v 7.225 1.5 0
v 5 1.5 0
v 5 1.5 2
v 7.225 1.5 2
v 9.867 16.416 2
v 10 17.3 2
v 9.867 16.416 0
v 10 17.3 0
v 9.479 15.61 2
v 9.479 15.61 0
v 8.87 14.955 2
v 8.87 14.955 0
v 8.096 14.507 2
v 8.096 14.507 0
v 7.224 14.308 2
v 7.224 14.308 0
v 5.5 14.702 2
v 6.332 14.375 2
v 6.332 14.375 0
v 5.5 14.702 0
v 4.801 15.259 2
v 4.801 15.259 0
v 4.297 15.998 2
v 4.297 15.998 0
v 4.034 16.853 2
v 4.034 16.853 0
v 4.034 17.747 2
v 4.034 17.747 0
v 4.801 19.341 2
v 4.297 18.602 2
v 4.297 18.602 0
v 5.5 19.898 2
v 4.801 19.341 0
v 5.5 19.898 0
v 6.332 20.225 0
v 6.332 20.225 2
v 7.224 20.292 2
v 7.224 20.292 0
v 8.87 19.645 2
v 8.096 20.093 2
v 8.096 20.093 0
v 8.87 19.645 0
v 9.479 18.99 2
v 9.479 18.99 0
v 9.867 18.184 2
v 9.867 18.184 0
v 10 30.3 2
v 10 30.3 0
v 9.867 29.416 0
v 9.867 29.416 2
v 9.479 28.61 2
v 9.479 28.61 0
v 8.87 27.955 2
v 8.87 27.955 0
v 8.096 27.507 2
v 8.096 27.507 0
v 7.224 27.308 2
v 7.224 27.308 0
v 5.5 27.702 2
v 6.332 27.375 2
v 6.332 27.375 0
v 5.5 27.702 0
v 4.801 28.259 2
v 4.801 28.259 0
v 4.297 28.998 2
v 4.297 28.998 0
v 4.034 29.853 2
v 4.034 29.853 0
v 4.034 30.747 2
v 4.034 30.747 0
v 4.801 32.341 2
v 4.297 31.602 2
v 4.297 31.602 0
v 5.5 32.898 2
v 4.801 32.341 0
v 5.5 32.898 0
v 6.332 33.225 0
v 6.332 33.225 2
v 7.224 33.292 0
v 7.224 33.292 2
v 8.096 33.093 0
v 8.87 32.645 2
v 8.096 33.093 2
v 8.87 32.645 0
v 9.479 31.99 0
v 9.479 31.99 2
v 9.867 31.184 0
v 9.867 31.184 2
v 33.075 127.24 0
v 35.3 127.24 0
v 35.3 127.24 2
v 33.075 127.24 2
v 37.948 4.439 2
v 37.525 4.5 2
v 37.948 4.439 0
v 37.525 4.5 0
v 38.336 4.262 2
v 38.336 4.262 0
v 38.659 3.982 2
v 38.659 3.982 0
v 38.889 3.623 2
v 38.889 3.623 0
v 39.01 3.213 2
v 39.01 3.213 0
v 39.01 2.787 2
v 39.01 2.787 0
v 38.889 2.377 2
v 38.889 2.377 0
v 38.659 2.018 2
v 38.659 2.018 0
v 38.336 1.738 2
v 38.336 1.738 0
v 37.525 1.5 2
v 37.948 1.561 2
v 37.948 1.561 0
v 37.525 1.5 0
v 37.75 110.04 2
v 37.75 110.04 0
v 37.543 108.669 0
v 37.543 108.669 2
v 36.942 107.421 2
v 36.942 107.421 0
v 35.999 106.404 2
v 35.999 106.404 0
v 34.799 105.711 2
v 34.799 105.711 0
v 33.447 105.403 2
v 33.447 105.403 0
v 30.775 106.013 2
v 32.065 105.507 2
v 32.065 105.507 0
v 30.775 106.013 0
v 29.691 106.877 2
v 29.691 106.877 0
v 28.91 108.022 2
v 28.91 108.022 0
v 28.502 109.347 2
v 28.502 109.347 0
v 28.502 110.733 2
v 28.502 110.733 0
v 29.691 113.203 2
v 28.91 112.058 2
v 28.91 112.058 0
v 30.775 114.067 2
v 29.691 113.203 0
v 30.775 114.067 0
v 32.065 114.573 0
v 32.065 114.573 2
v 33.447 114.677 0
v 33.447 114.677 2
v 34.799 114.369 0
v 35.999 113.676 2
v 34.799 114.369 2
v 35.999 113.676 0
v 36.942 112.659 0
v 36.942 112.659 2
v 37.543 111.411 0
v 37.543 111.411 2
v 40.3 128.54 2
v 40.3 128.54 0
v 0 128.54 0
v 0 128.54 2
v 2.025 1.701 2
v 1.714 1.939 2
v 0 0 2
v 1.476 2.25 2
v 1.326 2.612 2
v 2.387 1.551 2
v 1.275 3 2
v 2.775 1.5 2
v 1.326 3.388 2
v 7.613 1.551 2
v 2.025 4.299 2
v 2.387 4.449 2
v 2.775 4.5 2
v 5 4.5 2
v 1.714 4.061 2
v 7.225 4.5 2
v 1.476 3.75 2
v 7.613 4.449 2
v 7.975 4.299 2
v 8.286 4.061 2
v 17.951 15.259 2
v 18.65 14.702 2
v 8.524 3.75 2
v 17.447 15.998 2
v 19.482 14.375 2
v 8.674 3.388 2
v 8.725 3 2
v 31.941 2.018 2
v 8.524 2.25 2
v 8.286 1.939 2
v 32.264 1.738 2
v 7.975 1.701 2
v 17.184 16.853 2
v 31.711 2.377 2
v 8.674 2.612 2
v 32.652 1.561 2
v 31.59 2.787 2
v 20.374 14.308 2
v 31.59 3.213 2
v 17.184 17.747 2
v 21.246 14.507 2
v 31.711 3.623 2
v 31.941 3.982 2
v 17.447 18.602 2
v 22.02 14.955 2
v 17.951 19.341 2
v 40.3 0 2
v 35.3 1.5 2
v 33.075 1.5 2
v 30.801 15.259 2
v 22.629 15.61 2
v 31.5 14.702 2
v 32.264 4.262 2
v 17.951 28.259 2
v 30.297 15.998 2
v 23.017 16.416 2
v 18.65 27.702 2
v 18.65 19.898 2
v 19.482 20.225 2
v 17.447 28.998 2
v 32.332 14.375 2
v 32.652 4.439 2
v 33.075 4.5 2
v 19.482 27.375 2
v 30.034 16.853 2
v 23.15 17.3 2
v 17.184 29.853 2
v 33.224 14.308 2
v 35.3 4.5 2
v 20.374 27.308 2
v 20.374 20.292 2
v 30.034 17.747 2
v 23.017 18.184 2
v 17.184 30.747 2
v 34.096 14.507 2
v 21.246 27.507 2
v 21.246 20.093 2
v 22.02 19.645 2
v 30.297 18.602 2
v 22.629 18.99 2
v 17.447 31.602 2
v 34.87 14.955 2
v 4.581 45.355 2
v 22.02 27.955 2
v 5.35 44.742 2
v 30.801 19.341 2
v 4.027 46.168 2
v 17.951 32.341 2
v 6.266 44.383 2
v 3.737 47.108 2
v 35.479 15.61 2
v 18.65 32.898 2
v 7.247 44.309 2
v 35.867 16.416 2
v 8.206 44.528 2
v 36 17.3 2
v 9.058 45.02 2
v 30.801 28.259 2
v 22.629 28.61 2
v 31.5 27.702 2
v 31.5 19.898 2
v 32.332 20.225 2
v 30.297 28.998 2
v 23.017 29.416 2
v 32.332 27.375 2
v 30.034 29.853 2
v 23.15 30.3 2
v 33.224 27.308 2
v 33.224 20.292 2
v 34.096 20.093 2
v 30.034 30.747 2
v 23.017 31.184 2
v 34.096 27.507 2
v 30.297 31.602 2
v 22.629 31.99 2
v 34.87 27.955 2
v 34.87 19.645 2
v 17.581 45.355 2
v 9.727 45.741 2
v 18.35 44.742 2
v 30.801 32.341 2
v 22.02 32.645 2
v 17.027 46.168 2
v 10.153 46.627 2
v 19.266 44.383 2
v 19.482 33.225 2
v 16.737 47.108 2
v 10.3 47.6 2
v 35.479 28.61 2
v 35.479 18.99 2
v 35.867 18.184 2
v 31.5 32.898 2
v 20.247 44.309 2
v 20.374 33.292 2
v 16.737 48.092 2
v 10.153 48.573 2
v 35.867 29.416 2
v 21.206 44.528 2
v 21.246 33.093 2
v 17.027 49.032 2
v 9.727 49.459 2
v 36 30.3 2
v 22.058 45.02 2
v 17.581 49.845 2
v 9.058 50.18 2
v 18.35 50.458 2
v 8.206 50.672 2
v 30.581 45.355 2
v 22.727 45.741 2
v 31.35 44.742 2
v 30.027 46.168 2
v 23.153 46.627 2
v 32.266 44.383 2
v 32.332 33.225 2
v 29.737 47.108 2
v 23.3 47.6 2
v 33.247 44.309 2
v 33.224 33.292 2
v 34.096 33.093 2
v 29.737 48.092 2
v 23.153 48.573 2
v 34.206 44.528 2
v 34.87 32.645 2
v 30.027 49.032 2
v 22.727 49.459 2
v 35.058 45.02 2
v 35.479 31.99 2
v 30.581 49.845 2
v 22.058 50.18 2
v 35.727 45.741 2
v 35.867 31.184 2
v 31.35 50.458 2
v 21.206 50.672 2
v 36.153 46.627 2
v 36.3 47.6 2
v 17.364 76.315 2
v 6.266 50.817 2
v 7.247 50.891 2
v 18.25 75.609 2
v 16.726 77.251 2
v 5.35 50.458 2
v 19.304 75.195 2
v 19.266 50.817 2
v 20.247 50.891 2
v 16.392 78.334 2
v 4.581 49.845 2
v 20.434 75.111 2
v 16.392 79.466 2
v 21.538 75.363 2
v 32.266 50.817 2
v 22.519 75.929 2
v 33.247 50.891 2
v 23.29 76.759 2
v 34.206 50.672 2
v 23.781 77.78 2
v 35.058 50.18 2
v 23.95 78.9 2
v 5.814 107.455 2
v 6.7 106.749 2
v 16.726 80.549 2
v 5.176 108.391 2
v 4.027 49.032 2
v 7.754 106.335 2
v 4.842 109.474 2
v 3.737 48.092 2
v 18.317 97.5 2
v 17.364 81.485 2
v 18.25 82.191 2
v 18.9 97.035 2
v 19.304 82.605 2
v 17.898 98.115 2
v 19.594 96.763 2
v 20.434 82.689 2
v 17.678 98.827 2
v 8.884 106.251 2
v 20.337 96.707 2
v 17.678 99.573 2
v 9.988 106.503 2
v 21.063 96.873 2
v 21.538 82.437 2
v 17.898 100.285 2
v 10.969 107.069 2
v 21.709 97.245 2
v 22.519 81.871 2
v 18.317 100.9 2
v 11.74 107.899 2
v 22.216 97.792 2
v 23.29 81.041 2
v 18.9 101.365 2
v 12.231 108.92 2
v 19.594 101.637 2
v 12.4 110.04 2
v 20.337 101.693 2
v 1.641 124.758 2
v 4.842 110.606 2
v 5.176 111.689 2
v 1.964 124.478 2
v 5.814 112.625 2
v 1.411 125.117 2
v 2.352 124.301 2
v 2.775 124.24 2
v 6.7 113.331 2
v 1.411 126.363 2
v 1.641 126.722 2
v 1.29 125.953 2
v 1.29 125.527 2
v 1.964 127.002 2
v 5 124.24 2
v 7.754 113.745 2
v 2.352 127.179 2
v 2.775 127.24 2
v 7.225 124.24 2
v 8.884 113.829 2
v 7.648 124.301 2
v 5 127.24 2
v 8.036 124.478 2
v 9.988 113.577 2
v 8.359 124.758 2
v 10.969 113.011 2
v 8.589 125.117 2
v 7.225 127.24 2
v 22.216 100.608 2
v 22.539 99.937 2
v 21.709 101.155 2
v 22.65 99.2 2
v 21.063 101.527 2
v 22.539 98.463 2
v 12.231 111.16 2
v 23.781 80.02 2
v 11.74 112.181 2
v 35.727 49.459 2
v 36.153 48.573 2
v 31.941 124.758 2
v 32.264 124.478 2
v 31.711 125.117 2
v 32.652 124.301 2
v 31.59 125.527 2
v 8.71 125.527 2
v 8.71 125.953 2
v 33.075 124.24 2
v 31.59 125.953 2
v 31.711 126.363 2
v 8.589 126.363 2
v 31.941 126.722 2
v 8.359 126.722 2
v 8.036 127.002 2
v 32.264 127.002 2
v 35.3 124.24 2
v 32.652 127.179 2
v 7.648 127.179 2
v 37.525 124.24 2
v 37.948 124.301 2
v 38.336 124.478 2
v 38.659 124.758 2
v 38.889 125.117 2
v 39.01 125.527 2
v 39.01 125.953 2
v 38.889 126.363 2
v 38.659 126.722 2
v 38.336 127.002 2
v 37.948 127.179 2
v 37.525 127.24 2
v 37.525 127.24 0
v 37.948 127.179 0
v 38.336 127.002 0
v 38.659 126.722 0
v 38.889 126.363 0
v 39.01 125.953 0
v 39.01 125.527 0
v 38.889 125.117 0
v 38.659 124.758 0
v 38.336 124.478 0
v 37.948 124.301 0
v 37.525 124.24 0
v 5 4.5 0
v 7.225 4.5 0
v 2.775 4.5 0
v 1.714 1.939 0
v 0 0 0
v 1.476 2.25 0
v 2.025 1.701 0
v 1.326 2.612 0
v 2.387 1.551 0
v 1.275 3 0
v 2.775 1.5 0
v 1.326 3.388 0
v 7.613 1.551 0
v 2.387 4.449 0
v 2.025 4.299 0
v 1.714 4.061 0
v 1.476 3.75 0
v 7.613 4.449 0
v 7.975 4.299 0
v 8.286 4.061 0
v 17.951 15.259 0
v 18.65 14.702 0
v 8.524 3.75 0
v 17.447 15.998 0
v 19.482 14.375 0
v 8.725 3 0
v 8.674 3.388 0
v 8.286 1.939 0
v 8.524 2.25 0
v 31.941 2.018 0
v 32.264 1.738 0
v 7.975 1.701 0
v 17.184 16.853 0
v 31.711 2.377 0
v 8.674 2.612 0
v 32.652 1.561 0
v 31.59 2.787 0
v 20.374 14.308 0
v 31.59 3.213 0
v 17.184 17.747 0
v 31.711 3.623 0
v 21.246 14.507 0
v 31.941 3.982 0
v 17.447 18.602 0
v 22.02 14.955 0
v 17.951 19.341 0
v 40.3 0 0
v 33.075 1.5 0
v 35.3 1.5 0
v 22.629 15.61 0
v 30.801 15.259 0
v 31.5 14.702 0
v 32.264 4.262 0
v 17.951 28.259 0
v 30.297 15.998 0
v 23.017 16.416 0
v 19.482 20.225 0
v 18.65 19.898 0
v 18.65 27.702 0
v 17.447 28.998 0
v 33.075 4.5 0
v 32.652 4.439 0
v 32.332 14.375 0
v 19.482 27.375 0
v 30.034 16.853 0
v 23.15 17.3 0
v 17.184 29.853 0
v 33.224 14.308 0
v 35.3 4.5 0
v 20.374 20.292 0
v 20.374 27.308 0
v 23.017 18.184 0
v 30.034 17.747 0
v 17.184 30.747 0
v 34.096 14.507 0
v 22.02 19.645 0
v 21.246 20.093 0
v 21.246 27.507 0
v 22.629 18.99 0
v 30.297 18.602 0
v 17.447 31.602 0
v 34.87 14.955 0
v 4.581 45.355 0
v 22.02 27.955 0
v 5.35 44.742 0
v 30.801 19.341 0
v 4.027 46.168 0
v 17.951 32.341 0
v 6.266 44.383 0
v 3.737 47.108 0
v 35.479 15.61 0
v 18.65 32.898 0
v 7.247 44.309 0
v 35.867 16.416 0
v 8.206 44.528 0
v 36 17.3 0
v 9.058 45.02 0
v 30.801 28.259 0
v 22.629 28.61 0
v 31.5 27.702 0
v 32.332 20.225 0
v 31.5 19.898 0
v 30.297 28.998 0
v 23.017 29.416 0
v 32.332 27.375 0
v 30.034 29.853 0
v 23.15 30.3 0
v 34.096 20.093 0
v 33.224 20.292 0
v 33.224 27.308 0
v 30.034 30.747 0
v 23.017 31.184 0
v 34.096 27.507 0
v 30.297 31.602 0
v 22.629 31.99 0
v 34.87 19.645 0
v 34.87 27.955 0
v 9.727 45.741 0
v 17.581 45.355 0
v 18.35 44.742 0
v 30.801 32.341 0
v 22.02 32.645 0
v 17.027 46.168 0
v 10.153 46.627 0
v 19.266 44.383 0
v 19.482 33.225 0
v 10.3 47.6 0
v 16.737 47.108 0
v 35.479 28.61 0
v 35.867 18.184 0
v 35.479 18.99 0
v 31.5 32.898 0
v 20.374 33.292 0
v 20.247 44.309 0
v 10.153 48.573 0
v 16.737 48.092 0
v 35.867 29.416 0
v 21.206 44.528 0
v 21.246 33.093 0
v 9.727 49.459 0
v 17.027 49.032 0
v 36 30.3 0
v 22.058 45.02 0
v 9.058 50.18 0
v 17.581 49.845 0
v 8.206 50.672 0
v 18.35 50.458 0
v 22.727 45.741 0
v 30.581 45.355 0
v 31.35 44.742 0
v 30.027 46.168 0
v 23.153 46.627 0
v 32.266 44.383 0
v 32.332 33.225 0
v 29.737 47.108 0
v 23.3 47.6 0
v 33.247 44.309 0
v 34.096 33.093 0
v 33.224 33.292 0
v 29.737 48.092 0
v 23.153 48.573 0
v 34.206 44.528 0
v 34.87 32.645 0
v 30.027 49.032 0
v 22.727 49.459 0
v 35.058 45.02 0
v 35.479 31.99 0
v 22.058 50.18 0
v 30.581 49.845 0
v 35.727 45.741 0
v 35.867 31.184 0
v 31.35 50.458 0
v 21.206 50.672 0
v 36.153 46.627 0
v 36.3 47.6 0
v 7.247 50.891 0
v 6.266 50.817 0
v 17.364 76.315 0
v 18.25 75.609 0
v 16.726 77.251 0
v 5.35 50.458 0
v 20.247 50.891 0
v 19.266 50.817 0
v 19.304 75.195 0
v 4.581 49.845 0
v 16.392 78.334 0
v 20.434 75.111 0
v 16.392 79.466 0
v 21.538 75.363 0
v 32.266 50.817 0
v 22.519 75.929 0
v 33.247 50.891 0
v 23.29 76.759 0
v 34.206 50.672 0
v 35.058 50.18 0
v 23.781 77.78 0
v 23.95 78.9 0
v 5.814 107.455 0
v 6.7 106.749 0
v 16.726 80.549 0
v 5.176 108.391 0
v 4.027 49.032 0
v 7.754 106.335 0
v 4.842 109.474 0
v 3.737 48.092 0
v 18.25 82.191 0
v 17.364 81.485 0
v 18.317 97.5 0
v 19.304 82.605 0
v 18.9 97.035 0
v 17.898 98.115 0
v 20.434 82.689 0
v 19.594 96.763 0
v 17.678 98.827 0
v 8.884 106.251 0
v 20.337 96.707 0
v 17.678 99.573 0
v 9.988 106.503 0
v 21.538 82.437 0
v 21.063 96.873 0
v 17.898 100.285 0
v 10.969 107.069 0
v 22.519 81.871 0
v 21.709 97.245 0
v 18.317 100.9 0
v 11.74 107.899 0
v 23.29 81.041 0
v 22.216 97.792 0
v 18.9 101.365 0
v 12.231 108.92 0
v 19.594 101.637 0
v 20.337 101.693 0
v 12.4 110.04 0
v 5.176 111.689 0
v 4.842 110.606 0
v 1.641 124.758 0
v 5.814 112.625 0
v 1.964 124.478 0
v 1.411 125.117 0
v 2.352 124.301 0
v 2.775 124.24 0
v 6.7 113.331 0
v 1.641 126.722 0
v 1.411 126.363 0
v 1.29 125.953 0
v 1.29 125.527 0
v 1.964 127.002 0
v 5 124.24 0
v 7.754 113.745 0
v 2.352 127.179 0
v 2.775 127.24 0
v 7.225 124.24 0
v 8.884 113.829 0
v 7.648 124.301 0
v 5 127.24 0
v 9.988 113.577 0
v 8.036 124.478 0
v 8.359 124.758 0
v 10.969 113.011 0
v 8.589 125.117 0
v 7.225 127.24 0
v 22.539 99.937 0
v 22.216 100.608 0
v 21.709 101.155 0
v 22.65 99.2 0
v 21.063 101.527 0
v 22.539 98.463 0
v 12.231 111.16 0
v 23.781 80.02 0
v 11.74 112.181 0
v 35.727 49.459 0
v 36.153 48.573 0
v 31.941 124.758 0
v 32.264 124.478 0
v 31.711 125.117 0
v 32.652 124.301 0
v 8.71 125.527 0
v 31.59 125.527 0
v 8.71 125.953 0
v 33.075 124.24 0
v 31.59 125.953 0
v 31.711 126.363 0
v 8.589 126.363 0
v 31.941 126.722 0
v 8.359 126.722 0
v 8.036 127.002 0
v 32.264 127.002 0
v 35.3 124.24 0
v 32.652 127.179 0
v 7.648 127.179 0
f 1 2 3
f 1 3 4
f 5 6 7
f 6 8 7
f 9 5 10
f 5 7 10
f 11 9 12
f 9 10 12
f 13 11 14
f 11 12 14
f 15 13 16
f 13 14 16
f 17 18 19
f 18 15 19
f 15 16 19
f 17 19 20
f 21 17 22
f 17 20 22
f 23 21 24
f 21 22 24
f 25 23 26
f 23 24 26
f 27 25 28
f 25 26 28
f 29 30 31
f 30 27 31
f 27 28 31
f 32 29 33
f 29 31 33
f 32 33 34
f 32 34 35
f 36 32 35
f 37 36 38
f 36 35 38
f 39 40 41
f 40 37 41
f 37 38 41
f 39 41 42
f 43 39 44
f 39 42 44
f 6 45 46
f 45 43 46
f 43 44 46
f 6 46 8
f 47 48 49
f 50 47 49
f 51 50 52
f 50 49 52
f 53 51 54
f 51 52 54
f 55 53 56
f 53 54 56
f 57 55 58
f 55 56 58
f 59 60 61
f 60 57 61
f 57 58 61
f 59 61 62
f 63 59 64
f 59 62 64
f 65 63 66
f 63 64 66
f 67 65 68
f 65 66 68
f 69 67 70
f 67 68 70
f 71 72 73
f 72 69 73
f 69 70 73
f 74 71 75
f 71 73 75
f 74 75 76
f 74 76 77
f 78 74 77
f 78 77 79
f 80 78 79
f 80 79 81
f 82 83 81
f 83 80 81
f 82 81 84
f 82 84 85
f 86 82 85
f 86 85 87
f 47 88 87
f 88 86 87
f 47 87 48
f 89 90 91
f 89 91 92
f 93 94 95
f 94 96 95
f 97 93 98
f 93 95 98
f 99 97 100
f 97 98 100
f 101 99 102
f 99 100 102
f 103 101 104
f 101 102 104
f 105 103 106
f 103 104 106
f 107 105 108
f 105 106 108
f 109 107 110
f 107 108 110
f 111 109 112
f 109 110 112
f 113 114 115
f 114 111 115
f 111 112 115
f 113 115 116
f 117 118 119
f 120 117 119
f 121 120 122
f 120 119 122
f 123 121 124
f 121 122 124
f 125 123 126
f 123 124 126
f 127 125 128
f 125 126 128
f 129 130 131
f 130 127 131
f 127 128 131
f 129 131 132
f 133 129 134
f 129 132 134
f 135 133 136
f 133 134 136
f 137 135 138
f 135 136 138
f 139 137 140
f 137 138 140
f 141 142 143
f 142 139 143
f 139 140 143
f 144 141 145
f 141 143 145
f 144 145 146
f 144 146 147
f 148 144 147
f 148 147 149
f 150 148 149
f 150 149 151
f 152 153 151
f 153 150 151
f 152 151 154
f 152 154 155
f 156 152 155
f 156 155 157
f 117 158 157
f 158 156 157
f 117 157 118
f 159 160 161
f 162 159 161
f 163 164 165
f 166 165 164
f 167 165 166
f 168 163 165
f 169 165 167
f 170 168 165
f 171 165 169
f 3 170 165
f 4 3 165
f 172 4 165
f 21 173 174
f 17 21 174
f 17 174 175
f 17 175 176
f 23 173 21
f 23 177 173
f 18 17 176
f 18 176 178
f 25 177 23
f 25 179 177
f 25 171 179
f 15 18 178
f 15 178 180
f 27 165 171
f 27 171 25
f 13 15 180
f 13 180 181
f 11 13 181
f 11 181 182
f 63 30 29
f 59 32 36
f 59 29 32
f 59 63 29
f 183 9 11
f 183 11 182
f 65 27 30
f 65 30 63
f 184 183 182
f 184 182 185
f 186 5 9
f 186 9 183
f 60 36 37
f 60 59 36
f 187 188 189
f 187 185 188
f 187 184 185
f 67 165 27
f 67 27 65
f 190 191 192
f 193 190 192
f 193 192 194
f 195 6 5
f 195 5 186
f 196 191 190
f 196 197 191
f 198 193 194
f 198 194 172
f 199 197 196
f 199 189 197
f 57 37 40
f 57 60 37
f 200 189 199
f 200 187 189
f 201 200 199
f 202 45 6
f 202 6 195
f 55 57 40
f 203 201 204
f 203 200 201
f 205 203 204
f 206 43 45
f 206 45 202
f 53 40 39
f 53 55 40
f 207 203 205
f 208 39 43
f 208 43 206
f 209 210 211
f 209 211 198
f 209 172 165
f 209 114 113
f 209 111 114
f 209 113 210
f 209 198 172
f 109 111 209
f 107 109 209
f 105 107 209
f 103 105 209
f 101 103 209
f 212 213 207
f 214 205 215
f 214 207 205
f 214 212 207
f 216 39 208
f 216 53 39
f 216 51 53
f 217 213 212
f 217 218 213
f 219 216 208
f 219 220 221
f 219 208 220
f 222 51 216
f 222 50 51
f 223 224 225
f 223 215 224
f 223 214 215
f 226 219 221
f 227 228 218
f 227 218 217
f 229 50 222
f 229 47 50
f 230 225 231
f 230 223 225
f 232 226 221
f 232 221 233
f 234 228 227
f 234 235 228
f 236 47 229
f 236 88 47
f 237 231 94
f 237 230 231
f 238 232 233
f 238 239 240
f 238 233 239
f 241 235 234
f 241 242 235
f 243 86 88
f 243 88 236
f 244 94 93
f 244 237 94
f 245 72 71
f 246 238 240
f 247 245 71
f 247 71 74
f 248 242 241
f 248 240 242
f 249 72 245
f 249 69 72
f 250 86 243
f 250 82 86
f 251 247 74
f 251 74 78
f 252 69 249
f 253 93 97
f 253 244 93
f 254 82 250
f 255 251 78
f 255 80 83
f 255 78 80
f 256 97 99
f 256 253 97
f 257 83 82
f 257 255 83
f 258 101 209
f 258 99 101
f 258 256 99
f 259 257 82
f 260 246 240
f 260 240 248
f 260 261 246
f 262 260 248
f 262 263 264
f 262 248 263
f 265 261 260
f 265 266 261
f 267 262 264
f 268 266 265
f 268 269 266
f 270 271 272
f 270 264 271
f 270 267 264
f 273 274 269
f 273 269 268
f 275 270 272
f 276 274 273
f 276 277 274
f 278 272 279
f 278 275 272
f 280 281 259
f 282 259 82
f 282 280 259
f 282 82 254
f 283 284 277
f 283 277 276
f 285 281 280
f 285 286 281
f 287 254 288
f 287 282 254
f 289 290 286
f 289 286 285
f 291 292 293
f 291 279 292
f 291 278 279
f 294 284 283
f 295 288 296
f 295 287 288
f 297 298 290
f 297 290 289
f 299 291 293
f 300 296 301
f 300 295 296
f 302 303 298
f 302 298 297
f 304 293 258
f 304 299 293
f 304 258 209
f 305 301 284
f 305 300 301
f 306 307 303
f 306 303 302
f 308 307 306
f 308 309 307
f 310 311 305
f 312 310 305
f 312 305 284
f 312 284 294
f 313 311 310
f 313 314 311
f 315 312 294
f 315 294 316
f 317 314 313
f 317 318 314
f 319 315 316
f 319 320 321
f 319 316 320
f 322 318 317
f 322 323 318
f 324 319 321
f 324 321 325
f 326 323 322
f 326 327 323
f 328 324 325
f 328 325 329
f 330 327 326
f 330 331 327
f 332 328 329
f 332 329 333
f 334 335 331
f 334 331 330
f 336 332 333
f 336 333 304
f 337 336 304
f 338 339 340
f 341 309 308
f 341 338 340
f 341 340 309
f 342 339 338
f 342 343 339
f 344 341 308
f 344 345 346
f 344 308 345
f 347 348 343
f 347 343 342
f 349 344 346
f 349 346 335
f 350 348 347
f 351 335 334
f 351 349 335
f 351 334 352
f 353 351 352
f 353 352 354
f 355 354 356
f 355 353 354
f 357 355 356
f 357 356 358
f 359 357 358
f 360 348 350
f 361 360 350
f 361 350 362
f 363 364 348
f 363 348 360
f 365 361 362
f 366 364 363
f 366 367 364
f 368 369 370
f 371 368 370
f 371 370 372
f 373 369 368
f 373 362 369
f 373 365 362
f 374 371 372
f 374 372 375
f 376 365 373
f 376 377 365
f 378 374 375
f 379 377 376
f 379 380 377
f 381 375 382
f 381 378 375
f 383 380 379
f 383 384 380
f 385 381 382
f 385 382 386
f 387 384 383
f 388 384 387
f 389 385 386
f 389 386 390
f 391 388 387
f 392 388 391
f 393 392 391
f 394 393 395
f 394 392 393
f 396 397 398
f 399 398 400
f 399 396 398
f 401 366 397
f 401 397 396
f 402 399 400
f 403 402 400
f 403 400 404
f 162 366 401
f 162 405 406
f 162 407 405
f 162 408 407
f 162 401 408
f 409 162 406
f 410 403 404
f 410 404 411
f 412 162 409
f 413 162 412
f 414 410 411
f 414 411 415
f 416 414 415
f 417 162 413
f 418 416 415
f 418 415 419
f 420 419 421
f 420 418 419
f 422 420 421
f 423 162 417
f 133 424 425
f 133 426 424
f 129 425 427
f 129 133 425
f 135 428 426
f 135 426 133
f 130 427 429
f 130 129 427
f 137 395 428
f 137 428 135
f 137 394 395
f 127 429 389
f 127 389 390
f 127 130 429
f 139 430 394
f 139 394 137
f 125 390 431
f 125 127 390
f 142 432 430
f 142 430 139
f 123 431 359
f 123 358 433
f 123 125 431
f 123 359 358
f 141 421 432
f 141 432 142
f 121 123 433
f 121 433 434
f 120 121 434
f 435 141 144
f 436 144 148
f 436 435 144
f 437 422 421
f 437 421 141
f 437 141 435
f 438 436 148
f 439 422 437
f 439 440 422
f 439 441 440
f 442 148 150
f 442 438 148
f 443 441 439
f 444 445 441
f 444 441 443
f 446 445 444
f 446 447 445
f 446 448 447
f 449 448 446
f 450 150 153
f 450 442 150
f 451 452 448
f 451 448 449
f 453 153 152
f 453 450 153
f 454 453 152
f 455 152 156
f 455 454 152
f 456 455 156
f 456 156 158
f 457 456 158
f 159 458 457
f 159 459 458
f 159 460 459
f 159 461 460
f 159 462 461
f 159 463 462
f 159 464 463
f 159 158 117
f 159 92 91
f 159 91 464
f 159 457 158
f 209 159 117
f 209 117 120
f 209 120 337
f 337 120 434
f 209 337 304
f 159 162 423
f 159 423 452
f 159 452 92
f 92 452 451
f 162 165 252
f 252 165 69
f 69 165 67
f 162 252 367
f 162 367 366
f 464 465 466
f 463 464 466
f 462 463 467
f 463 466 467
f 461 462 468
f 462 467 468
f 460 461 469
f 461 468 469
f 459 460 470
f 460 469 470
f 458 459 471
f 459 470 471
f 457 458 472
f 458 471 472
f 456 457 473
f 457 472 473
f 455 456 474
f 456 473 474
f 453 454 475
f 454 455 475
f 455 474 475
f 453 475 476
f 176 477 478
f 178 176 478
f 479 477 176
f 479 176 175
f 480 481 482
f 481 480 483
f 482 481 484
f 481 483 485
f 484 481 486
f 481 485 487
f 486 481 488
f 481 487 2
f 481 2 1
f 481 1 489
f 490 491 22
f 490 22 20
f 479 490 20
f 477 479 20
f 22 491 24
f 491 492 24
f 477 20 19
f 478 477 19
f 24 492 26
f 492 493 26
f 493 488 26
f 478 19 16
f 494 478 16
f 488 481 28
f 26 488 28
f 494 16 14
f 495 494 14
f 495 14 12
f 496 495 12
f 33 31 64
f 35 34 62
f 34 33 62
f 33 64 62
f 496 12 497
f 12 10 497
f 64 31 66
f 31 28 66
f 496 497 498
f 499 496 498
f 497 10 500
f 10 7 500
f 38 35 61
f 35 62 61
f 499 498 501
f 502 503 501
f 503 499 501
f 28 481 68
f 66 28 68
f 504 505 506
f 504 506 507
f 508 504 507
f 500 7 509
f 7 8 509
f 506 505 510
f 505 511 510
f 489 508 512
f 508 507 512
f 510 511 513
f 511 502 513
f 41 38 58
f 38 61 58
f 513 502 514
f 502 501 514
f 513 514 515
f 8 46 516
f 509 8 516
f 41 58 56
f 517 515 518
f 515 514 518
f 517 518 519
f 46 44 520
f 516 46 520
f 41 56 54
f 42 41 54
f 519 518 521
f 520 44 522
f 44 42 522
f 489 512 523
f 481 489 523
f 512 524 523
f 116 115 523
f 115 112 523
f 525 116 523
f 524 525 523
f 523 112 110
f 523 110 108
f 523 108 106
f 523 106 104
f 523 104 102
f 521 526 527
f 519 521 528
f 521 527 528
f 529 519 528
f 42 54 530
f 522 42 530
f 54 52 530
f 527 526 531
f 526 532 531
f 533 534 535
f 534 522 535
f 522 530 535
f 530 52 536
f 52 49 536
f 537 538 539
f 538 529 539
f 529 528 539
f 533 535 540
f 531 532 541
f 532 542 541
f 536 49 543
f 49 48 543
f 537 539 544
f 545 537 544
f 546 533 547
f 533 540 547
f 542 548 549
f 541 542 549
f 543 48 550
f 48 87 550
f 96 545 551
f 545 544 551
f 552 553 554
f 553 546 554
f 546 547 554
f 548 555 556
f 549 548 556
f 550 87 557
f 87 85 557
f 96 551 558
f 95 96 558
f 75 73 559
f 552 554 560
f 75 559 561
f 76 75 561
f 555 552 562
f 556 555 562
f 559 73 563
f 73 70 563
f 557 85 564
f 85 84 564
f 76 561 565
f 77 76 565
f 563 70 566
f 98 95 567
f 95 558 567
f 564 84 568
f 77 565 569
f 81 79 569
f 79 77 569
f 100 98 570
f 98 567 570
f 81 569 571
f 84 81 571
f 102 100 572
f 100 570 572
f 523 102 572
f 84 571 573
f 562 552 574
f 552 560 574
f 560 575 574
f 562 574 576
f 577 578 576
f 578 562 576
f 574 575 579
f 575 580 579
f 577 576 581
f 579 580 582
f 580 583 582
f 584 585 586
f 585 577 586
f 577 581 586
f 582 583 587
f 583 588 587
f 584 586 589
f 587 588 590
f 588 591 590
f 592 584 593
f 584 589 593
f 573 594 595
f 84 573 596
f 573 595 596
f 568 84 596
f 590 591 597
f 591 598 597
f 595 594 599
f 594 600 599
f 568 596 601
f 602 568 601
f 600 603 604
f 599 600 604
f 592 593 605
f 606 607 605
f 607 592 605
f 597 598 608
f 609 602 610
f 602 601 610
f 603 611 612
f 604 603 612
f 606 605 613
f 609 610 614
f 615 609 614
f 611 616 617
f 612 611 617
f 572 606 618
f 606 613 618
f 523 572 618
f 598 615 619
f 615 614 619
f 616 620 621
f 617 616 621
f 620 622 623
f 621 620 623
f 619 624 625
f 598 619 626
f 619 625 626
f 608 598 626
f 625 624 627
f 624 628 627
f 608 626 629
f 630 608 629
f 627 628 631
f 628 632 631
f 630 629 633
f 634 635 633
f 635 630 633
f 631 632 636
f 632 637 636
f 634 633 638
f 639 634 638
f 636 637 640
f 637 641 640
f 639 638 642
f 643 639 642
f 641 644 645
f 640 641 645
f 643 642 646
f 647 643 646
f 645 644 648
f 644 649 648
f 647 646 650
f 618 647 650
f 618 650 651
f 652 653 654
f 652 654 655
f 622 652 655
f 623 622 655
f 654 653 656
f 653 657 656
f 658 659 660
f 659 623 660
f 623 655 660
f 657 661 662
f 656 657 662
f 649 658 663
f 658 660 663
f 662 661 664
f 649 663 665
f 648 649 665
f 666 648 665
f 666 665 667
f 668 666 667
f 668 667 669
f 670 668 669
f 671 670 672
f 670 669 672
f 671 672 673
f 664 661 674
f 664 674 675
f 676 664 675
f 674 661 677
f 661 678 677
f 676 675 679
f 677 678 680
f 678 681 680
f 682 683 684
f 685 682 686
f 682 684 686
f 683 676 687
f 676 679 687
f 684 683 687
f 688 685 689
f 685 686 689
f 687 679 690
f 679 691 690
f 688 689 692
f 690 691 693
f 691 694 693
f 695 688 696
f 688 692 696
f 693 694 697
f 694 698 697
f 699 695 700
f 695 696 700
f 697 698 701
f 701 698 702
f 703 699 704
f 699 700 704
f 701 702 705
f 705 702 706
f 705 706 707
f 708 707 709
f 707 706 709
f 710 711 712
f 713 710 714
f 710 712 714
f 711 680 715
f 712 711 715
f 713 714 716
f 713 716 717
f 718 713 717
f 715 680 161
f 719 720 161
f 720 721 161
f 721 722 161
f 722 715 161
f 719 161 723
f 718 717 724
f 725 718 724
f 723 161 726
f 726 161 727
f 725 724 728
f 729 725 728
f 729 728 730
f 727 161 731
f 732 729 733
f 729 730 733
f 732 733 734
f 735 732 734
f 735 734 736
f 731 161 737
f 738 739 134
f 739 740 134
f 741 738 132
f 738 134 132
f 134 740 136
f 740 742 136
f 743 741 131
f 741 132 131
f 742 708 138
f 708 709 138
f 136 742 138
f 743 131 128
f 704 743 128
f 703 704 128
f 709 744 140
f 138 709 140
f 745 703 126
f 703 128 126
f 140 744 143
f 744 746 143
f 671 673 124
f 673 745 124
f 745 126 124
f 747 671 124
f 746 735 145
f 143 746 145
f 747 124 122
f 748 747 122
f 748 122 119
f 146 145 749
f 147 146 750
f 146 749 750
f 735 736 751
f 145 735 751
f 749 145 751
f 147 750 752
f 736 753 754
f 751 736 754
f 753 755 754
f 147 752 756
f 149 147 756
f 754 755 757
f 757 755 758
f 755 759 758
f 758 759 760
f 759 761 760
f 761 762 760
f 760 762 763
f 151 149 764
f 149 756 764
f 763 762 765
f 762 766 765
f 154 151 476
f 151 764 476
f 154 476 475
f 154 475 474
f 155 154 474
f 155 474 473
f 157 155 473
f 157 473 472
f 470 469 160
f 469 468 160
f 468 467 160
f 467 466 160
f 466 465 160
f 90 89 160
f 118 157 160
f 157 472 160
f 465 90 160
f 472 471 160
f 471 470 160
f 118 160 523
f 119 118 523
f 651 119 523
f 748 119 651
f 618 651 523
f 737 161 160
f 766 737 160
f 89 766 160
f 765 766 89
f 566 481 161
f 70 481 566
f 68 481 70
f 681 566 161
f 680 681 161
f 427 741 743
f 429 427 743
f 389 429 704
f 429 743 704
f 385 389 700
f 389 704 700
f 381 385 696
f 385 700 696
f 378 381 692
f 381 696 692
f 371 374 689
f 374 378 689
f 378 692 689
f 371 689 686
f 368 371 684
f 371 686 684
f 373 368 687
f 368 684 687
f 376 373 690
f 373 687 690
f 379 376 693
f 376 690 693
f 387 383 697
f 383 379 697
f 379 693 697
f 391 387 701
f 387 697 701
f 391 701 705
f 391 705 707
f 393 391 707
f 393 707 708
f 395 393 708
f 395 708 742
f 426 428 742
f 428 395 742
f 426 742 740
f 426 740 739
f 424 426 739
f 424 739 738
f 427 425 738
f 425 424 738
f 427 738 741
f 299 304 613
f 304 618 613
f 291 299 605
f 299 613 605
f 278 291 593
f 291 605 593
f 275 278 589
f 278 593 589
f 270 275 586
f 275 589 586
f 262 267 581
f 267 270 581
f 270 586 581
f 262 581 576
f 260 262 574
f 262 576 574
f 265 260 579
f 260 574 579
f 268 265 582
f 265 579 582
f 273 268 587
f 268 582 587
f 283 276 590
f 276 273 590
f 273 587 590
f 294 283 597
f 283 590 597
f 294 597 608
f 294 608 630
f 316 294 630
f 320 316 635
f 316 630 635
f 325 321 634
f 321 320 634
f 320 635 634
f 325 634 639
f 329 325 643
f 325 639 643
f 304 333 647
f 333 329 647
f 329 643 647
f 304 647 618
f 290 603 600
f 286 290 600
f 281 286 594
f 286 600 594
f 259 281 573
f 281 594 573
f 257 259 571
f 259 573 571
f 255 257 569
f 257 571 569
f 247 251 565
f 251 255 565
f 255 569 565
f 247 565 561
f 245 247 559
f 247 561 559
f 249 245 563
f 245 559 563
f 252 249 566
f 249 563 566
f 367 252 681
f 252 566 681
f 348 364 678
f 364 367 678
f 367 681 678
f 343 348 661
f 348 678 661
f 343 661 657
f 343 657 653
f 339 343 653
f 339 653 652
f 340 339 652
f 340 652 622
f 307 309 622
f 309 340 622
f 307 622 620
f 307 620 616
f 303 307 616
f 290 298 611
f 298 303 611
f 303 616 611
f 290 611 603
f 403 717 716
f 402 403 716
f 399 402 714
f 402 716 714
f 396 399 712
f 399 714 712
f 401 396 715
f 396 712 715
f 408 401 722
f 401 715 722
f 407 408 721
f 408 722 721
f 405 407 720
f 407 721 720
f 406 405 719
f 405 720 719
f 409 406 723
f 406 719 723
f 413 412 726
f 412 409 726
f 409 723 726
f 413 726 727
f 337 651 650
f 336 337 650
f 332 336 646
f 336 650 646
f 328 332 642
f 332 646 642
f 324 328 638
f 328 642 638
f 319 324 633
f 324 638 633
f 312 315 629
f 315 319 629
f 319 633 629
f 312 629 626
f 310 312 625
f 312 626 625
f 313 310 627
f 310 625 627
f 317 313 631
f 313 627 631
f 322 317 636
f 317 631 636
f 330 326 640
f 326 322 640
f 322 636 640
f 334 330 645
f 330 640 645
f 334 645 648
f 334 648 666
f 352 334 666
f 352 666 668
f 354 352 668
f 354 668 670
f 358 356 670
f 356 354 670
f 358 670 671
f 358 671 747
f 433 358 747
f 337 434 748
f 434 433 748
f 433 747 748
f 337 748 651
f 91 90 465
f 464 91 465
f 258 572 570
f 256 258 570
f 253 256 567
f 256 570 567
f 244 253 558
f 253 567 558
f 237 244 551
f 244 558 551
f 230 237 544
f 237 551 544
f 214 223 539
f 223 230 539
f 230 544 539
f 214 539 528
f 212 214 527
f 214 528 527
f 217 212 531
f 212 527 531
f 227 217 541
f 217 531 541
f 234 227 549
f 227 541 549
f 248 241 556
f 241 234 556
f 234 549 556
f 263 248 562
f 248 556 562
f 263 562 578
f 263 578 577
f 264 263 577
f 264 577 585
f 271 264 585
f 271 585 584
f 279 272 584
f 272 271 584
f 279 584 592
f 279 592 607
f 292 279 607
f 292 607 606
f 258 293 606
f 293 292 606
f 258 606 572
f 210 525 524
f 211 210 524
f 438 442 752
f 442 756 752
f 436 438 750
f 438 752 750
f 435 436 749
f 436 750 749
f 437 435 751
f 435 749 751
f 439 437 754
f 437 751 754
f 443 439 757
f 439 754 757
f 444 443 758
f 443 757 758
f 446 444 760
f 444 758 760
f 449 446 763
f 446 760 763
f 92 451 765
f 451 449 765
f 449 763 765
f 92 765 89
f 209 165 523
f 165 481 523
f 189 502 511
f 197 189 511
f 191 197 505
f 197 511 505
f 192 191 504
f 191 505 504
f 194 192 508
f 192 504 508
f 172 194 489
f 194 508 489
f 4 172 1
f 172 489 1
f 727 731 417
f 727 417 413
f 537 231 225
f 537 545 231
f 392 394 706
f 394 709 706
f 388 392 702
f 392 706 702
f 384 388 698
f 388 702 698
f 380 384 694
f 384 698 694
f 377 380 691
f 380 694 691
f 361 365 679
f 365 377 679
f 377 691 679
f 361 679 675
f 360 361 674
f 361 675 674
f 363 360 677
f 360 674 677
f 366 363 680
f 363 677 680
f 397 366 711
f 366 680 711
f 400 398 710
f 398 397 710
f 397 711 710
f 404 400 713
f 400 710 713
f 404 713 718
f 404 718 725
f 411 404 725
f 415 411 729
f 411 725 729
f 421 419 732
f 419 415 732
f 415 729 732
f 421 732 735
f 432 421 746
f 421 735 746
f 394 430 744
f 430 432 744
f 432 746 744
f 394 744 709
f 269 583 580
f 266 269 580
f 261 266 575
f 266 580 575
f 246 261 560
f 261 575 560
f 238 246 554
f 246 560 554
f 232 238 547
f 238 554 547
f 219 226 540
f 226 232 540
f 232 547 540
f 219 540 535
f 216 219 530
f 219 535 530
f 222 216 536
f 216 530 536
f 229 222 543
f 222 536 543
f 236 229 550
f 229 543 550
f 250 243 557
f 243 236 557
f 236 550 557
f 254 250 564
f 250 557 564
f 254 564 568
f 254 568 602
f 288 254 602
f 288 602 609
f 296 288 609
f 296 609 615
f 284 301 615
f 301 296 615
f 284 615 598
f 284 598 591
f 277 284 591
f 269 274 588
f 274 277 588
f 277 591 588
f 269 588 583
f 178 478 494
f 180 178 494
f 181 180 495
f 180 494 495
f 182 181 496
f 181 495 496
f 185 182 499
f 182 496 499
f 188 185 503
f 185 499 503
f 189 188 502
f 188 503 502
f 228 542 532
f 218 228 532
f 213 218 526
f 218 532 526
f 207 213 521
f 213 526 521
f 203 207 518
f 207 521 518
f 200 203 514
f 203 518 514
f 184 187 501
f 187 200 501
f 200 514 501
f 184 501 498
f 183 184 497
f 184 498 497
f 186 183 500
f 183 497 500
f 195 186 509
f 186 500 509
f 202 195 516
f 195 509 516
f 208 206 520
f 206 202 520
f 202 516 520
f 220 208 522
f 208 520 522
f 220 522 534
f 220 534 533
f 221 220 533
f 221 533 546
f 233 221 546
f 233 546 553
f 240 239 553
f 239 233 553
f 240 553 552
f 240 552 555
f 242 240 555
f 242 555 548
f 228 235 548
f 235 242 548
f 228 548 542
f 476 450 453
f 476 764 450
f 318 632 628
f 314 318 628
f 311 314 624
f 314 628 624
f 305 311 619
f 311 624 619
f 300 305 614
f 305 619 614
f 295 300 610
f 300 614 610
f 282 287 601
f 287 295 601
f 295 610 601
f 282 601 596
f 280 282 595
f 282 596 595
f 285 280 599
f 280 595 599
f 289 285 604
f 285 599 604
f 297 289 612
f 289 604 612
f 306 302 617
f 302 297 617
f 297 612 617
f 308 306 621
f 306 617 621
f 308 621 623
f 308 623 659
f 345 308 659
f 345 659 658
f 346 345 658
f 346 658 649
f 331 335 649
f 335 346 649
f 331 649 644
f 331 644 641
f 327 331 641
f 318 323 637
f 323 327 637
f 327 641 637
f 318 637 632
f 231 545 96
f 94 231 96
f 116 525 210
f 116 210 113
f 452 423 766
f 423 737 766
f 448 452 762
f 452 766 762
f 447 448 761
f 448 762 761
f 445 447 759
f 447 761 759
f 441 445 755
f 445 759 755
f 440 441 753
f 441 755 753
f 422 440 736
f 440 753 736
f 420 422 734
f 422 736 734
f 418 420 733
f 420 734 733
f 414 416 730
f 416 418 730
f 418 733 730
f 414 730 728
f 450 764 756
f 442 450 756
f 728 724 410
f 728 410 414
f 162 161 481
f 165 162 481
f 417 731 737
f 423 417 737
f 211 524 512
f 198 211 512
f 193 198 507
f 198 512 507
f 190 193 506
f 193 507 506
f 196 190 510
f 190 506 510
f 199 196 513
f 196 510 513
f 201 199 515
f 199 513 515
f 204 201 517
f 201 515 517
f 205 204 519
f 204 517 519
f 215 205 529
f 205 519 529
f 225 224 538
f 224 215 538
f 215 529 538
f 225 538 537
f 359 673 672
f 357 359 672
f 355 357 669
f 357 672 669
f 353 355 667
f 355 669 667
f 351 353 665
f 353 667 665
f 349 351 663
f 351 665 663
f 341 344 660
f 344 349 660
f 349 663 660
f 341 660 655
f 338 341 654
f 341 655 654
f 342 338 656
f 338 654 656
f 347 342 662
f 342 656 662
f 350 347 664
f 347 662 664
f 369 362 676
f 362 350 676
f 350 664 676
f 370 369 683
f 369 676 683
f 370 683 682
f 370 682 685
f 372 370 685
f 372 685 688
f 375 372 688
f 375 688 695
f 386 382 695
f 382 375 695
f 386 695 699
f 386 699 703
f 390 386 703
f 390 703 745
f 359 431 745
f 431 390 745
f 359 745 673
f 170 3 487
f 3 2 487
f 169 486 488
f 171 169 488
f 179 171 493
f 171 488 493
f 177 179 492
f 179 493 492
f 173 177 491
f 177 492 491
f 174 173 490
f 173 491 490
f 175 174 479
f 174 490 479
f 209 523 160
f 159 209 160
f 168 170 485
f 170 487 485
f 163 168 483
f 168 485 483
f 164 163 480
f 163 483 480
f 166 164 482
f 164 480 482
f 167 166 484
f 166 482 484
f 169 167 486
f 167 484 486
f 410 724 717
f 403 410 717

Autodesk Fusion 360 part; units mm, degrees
sketch "Sketch1" plane through (0, 0, 0) normal (0, 0, 1) x (1, 0, 0)
  line L0 (0, 0) -> (40.3, 0)
  line L1 (40.3, 0) -> (40.3, 128.54)
  line L2 (40.3, 128.54) -> (0, 128.54)
  line L3 (0, 128.54) -> (0, 0)
  line L4 (0, 0) -> (0, 3) construction
  line L5 (0, 3) -> (40.3, 3) construction
  line L6 (0, 0) -> (0, 17.3) construction
  line L7 (0, 17.3) -> (40.3, 17.3) construction
  line L8 (0, 17.3) -> (0, 30.3) construction
  line L9 (0, 30.3) -> (0, 47.6) construction
  line L10 (0, 47.6) -> (40.3, 47.6) construction
  line L11 (0, 30.3) -> (40.3, 30.3) construction
  line L12 (0, 47.6) -> (0, 78.9) construction
  line L13 (0, 78.9) -> (40.3, 78.9) construction
  line L14 (0, 78.9) -> (0, 99.2) construction
  line L15 (0, 99.2) -> (40.3, 99.2) construction
  line L16 (0, 128.54) -> (0, 110.04) construction
  line L17 (0, 110.04) -> (40.3, 110.04) construction
  line L18 (0, 0) -> (7, 0) construction
  line L19 (7, 0) -> (7, 47.6) construction
  line L20 (7, 0) -> (20, 0) construction
  line L21 (20, 0) -> (20, 47.6) construction
  line L22 (20, 0) -> (33, 0) construction
  line L23 (33, 0) -> (33, 47.6) construction
  circle A0 centre (7, 30.3) radius 3
  circle A1 centre (7, 17.3) radius 3
  circle A2 centre (20.15, 30.3) radius 3
  circle A3 centre (20.15, 17.3) radius 3
  circle A4 centre (33, 30.3) radius 3
  circle A5 centre (33, 17.3) radius 3
  circle A6 centre (7, 47.6) radius 3.3
  circle A7 centre (20, 47.6) radius 3.3
  circle A8 centre (33, 47.6) radius 3.3
  line L24 (0, 78.9) -> (20.15, 78.9) construction
  circle A9 centre (20.15, 78.9) radius 3.8
  line L25 (0, 99.2) -> (20.15, 99.2) construction
  circle A10 centre (20.15, 99.2) radius 2.5
  line L26 (0, 110.04) -> (0.6568, 110.04) construction
  line L27 (0, 110.04) -> (8.6, 110.04) construction
  line L28 (8.6, 110.04) -> (33.1, 110.04) construction
  circle A11 centre (8.6, 110.04) radius 3.8
  circle A12 centre (33.1, 110.04) radius 4.65
  line L29 (0, 3) -> (5, 3) construction
  line L30 (5, 3) -> (5, 4.5) construction
  line L31 (5, 3) -> (5, 1.5) construction
  line L32 (5, 1.5) -> (7.225, 1.5)
  line L33 (5, 1.5) -> (2.775, 1.5)
  line L34 (5, 4.5) -> (7.225, 4.5)
  line L35 (5, 4.5) -> (2.775, 4.5)
  line L36 (2.775, 3) -> (1.275, 3)
  arc A13 (2.775, 4.5) -> (2.775, 1.5) centre (2.775, 3) ccw
  line L37 (7.225, 3) -> (8.725, 3)
  arc A14 (7.225, 1.5) -> (7.225, 4.5) centre (7.225, 3) ccw
  arc A15 (2.775, 4.5) -> (2.775, 1.5) centre (2.775, 3) ccw
  line L38 (5, 4.5) -> (2.775, 4.5)
  line L39 (5, 4.5) -> (7.225, 4.5)
  arc A16 (7.225, 1.5) -> (7.225, 4.5) centre (7.225, 3) ccw
  line L40 (5, 1.5) -> (7.225, 1.5)
  line L41 (5, 1.5) -> (2.775, 1.5)
  line L42 (40.3, 0) -> (35.3, 0) construction
  line L43 (35.3, 0) -> (35.3, 3) construction
  arc A17 (33.075, 4.5) -> (33.075, 1.5) centre (33.075, 3) ccw
  line L44 (35.3, 4.5) -> (33.075, 4.5)
  line L45 (35.3, 4.5) -> (37.525, 4.5)
  line L46 (35.3, 1.5) -> (33.075, 1.5)
  line L47 (35.3, 1.5) -> (37.525, 1.5)
  arc A18 (37.525, 1.5) -> (37.525, 4.5) centre (37.525, 3) ccw
  line L48 (0, 128.54) -> (0, 125.74) construction
  line L49 (0, 125.74) -> (40.3, 125.74) construction
  line L50 (0, 125.74) -> (5, 125.74) construction
  line L51 (40.3, 125.74) -> (35.3, 125.74) construction
  arc A19 (2.775, 127.24) -> (2.775, 124.24) centre (2.775, 125.74) ccw
  line L52 (5, 127.24) -> (2.775, 127.24)
  line L53 (5, 127.24) -> (7.225, 127.24)
  line L54 (5, 124.24) -> (2.775, 124.24)
  line L55 (5, 124.24) -> (7.225, 124.24)
  arc A20 (7.225, 124.24) -> (7.225, 127.24) centre (7.225, 125.74) ccw
  arc A21 (33.075, 127.24) -> (33.075, 124.24) centre (33.075, 125.74) ccw
  line L56 (35.3, 127.24) -> (33.075, 127.24)
  line L57 (35.3, 127.24) -> (37.525, 127.24)
  line L58 (35.3, 124.24) -> (33.075, 124.24)
  line L59 (35.3, 124.24) -> (37.525, 124.24)
  arc A22 (37.525, 124.24) -> (37.525, 127.24) centre (37.525, 125.74) ccw
  dimension "d1" = 40.3
  dimension "d2" = 128.54
  dimension "d3" = 3
  dimension "d5" = 17.3
  dimension "d6" = 13
  dimension "d7" = 17.3
  dimension "d8" = 31.3
  dimension "d9" = 20.3
  dimension "d10" = 18.5
  dimension "d11" = 7
  dimension "d12" = 13
  dimension "d13" = 13
  dimension "d14" = 6
  dimension "d15" = 6
  dimension "d16" = 6
  dimension "d17" = 6
  dimension "d18" = 6
  dimension "d19" = 6
  dimension "d20" = 6.6
  dimension "d21" = 6.6
  dimension "d22" = 6.6
  dimension "d23" = 7.6
  dimension "d24" = 5
  dimension "d25" = 8.6
  dimension "d26" = 24.5
  dimension "d27" = 7.6
  dimension "d28" = 9.3
  dimension "d29" = 5
  dimension "d30" = 1.5
  dimension "d31" = 1.5
  dimension "d32" = 2.225
  dimension "d33" = 2.225
  dimension "d35" = 2.225
  dimension "d36" = 2.225
  dimension "d37" = 1.5
  dimension "d38" = 1.5
  dimension "d39" = 2.225
  dimension "d40" = 2.225
  dimension "d41" = 2.225
  dimension "d42" = 2.225
  dimension "d43" = 5
  dimension "d44" = 2.225
  dimension "d45" = 2.225
  dimension "d46" = 2.225
  dimension "d47" = 2.225
  dimension "d48" = 2.225
  dimension "d49" = 2.8
  dimension "d50" = 5
  dimension "d51" = 5
  dimension "d52" = 2.225
  dimension "d53" = 2.225
  dimension "d54" = 2.225
  dimension "d56" = 2.225
  dimension "d57" = 2.225
  dimension "d58" = 2.225
  dimension "d59" = 2.225
  dimension "d61" = 2.225
extrude "Extrude1" add sketch "Sketch1" along normal blind 2
equation "d32 = ( 4.45 / 2 ) * 1 mm"
equation "d33 = ( 4.45 / 2 ) * 1 mm"
equation "d35 = ( 4.45 / 2 ) * 1 mm"
equation "d36 = ( 4.45 / 2 ) * 1 mm"
equation "d39 = ( 4.45 / 2 ) * 1 mm"
equation "d40 = ( 4.45 / 2 ) * 1 mm"
equation "d41 = ( 4.45 / 2 ) * 1 mm"
equation "d42 = ( 4.45 / 2 ) * 1 mm"
equation "d44 = ( 4.45 / 2 ) * 1 mm"
equation "d45 = ( 4.45 / 2 ) * 1 mm"
equation "d46 = ( 4.45 / 2 ) * 1 mm"
equation "d47 = ( 4.45 / 2 ) * 1 mm"
equation "d48 = ( 4.45 / 2 ) * 1 mm"
equation "d52 = ( 4.45 / 2 ) * 1 mm"
equation "d53 = ( 4.45 / 2 ) * 1 mm"
equation "d54 = ( 4.45 / 2 ) * 1 mm"
equation "d56 = ( 4.45 / 2 ) * 1 mm"
equation "d57 = ( 4.45 / 2 ) * 1 mm"
equation "d58 = ( 4.45 / 2 ) * 1 mm"
equation "d59 = ( 4.45 / 2 ) * 1 mm"
equation "d61 = ( 4.45 / 2 ) * 1 mm"
